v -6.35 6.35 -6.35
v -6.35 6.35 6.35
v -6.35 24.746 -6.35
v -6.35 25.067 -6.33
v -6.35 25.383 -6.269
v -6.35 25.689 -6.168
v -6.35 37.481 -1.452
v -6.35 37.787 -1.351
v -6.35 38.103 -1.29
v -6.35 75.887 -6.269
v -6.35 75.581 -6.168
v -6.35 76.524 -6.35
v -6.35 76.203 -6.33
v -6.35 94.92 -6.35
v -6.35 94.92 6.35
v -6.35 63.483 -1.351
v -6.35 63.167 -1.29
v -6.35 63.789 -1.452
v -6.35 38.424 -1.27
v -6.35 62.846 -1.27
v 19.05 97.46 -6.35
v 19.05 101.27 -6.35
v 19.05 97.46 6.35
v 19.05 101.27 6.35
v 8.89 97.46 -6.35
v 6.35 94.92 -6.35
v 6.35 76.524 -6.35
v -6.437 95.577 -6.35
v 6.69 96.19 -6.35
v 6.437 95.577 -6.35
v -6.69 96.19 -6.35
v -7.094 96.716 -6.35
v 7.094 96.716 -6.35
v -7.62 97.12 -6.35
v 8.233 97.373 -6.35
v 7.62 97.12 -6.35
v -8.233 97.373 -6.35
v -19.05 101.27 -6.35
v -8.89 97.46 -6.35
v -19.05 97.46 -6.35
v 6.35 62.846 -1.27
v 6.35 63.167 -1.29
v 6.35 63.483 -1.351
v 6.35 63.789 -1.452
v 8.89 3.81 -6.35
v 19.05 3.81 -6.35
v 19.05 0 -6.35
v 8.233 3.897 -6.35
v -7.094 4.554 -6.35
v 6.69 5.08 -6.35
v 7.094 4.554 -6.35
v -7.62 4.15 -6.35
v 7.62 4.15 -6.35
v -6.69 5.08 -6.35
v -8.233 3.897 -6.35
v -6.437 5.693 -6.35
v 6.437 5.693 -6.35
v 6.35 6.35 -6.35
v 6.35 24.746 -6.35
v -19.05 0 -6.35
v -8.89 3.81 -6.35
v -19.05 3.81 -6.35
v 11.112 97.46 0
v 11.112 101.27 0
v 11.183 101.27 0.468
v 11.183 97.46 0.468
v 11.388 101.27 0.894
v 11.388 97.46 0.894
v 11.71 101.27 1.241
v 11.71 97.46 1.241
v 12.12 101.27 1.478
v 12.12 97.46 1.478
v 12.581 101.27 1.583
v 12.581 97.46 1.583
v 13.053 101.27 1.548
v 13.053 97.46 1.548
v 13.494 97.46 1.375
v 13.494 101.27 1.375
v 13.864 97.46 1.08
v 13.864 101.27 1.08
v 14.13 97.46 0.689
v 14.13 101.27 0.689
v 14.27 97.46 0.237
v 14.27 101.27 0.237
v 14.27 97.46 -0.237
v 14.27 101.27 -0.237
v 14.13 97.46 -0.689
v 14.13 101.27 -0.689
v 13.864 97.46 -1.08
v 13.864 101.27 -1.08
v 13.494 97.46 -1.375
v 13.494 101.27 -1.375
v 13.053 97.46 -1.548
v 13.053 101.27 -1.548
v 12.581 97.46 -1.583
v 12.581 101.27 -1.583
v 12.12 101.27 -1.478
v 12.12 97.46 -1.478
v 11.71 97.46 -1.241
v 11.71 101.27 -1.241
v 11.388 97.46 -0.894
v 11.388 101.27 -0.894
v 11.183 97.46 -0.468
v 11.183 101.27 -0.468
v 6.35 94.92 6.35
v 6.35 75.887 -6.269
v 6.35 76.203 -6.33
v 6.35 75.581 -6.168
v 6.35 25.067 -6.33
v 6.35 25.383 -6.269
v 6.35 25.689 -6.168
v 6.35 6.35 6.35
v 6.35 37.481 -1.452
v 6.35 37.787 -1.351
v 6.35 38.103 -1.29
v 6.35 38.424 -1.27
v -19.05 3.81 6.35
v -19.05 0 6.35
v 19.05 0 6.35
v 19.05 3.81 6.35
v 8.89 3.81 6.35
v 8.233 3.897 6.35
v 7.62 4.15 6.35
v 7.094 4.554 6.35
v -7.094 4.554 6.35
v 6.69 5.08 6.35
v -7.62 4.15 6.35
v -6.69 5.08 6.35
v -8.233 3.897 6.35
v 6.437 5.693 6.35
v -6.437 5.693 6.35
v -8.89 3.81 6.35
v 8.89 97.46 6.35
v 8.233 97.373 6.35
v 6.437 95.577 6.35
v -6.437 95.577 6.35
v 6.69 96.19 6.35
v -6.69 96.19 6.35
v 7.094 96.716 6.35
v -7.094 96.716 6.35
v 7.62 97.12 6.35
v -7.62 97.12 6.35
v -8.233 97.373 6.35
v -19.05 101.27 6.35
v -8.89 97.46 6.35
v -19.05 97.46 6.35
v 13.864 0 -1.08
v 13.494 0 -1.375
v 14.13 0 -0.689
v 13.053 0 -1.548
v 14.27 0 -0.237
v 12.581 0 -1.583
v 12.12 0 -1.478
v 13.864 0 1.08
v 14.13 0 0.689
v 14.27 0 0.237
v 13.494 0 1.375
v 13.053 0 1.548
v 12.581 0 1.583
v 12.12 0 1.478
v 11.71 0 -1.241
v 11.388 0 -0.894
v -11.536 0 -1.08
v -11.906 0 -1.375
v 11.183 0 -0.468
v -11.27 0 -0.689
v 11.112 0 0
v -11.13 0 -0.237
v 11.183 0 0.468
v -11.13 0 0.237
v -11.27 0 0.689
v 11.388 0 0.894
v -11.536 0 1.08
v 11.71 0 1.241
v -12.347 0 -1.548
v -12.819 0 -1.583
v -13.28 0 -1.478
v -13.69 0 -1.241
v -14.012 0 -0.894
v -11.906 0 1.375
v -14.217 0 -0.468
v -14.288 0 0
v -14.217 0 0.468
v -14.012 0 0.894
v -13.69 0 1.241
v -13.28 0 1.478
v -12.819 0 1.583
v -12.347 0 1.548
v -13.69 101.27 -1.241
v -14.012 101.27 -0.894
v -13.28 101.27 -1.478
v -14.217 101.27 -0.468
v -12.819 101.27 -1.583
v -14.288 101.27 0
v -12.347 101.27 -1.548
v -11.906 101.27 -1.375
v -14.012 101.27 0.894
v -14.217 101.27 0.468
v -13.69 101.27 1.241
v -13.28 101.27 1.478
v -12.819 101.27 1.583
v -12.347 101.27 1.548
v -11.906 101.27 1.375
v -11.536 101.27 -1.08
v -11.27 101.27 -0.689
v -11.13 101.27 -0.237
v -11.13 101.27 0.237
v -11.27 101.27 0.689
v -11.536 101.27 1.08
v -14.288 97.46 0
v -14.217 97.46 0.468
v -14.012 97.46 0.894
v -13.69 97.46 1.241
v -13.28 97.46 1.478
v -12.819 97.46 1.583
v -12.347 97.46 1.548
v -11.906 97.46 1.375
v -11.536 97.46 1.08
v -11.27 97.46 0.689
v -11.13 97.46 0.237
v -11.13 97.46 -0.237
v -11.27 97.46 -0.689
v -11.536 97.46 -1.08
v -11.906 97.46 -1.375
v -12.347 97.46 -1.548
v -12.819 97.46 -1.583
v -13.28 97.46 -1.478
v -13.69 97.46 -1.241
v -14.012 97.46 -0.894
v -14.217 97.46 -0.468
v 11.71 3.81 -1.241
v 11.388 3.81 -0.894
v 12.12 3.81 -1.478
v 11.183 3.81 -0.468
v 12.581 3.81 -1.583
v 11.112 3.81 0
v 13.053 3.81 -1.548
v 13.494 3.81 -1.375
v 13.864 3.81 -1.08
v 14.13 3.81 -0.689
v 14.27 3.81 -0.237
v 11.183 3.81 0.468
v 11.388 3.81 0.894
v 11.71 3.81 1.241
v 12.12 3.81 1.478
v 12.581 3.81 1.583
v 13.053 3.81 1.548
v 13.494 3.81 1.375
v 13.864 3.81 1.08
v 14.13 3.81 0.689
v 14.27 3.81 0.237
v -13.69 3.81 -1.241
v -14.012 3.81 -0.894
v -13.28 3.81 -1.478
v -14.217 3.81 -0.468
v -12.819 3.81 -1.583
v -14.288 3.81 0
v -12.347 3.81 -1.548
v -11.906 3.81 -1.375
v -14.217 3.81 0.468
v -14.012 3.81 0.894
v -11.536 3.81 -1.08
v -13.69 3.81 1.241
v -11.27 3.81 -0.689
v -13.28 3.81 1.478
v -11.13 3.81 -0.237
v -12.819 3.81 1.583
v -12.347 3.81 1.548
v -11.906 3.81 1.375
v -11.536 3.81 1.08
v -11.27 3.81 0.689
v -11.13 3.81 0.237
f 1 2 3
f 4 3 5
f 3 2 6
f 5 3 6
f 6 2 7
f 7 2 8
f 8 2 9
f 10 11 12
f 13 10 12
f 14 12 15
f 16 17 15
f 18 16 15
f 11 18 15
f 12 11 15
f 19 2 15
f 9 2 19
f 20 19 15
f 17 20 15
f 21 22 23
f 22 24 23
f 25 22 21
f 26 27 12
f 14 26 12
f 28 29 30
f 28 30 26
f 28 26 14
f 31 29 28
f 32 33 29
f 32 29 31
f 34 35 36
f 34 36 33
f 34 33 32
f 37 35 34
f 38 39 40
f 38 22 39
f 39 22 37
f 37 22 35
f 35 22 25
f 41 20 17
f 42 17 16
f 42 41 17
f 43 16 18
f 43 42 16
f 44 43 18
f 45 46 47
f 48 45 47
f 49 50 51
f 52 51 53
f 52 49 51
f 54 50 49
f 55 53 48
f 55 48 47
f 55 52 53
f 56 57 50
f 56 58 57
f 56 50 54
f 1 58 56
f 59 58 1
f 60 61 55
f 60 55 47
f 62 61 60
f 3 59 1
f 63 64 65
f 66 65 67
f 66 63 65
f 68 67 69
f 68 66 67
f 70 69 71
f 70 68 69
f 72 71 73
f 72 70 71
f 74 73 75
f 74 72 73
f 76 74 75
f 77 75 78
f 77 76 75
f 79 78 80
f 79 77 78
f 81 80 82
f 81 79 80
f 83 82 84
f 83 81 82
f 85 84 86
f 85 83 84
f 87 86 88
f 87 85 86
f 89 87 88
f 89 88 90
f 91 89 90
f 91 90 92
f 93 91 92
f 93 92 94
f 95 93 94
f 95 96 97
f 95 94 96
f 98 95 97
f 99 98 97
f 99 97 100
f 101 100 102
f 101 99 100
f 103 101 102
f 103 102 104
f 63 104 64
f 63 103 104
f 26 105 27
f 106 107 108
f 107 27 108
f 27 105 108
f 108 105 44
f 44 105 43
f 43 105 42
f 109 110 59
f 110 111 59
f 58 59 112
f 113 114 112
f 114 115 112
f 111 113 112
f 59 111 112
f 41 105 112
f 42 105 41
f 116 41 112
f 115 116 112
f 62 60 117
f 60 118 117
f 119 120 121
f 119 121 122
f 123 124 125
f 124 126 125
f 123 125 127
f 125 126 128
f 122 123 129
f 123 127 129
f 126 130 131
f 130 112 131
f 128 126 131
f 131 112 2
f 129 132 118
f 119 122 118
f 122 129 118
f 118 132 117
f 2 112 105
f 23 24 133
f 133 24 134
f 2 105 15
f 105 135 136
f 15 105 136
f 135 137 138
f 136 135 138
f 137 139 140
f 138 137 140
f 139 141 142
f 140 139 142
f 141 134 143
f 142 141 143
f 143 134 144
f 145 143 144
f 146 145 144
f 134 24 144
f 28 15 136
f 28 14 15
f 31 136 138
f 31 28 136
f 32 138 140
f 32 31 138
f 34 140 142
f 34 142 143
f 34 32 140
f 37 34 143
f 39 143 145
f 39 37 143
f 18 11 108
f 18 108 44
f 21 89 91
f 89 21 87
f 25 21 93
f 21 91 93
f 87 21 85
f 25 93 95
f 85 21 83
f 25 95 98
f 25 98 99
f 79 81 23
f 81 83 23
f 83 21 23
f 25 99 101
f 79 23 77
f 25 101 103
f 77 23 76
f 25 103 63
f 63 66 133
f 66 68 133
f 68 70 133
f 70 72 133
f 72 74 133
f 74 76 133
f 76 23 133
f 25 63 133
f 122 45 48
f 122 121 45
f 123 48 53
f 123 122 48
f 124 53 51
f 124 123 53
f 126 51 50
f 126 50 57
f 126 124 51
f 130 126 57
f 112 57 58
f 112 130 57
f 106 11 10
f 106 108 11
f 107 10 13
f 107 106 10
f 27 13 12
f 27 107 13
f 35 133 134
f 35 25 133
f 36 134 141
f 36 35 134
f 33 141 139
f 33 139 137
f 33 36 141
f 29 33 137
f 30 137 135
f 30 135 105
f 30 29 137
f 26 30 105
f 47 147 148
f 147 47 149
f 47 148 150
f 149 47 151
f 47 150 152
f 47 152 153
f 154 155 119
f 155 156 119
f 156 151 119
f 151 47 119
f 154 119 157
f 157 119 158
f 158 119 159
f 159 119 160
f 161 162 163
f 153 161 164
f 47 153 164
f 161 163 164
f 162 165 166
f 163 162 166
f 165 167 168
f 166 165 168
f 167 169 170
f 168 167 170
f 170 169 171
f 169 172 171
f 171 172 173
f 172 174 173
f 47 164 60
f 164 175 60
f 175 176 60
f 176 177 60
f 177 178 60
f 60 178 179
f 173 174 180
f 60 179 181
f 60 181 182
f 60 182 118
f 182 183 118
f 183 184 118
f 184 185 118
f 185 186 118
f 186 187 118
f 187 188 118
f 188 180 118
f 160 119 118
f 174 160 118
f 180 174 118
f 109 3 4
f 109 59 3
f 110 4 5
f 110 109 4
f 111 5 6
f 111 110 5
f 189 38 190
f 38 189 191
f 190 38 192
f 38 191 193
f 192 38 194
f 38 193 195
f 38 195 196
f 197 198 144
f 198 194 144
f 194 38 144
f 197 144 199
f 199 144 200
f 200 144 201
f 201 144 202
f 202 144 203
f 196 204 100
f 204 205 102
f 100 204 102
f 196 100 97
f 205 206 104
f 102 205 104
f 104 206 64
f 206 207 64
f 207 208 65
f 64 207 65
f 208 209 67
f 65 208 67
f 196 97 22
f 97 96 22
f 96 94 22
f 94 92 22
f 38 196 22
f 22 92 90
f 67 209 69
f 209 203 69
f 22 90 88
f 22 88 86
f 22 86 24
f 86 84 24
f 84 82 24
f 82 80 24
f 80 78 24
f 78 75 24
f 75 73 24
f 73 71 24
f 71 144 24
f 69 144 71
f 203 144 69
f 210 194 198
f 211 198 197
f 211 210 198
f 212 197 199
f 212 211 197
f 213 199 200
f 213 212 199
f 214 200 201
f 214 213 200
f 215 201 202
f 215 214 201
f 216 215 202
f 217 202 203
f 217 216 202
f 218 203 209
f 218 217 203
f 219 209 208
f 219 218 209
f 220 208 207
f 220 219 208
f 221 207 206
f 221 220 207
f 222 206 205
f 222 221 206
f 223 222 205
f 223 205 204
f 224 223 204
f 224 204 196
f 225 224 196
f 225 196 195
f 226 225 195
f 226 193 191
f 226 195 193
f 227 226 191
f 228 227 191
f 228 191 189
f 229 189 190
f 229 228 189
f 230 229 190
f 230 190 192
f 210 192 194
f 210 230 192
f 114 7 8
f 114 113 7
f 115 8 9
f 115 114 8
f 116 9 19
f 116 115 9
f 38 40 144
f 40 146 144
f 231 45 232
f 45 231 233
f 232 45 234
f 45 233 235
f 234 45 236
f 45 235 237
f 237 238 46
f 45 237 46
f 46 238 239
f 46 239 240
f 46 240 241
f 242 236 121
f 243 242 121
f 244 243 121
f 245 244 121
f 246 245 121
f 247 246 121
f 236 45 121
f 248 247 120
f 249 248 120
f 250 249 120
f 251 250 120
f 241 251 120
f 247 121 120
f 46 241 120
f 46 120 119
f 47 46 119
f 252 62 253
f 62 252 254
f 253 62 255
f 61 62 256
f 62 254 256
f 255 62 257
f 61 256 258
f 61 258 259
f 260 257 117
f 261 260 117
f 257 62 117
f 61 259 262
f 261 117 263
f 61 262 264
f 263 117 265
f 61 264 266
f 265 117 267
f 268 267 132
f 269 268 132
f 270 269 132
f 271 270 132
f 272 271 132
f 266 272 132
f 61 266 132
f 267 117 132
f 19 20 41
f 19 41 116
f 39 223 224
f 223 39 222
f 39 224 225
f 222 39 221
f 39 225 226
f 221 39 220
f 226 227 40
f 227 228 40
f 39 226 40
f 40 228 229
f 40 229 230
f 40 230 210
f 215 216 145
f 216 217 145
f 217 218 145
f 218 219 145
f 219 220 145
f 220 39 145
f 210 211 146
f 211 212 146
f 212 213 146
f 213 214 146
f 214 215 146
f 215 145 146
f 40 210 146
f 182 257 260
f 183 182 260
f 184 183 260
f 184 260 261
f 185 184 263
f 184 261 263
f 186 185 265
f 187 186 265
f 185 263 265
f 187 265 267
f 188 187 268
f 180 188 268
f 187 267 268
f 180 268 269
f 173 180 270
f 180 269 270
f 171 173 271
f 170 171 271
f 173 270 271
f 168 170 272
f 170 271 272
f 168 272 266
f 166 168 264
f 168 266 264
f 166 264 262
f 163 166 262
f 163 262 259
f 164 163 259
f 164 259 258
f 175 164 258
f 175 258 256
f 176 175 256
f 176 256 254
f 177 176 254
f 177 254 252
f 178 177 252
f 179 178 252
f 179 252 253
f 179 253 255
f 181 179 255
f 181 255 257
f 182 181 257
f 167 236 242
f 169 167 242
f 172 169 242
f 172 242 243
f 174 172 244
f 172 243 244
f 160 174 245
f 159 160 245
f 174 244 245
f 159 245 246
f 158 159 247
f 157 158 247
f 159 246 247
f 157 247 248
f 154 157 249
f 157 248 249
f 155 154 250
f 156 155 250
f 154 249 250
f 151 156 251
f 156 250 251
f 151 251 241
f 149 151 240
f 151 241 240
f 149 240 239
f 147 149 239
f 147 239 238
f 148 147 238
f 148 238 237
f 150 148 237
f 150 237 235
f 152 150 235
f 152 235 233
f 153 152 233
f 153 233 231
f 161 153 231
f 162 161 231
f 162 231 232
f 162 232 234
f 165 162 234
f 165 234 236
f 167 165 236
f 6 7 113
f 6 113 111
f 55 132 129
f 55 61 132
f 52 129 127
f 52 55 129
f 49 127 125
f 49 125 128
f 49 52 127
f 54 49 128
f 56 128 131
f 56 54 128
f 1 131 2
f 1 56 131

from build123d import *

# Parameters (mm, degrees)
BOSS_EXTRUDE1_DEPTH = 6.35
SKETCH2_R           = 1.5875
MOUNT_HOLES_DEPTH   = 12.7
FILLET1_R           = 2.54
CUT_EXTRUDE1_DEPTH  = 105.599497571
FILLET2_R           = 2.54


with BuildPart() as part:
    # Sketch1 → Boss-Extrude1 (new, symmetric)
    with BuildSketch(Plane.XY):
        Polygon((19.05, 0), (-19.05, 0), (-19.05, 3.81), (-6.35, 3.81), (-6.35, 97.4598), (-19.05, 97.4598), (-19.05, 101.2698), (19.05, 101.2698), (19.05, 97.4598), (6.35, 97.4598), (6.35, 3.81), (19.05, 3.81), align=None)
    extrude(amount=BOSS_EXTRUDE1_DEPTH, both=True)

    # Sketch2 → Mount_Holes (cut)
    with BuildSketch(Plane(origin=(0, 3.81, 0), x_dir=(1, 0, 0), z_dir=(0, 1, 0))):
        with Locations(Location((12.7, 0, 0), (0, 0, 180))):
            Circle(SKETCH2_R)
        with Locations(Location((-12.7, 0, 0), (0, 0, 180))):
            Circle(SKETCH2_R)
    mount_holes = extrude(amount=-MOUNT_HOLES_DEPTH, mode=Mode.SUBTRACT)

    # Mirror1: Mount_Holes across plane
    add(mount_holes.mirror(Plane.ZX.offset(50.6349)), mode=Mode.SUBTRACT)

    # Fillet1
    fillet1_edges = [part.edges().sort_by_distance(p)[0] for p in [
        (-6.35, 3.81, 0),
        (-6.35, 97.4598, 0),
        (6.35, 97.4598, 0),
        (6.35, 3.81, 0),
    ]]
    fillet(fillet1_edges, radius=FILLET1_R)

    # Sketch3 → Cut-Extrude1 (cut, through all)
    with BuildSketch(Plane.ZY.offset(6.35)):
        Polygon((-6.35, 25.2349), (-6.35, 76.0349), (-1.27, 63.3349), (-1.27, 37.9349), align=None)
    extrude(amount=-CUT_EXTRUDE1_DEPTH, mode=Mode.SUBTRACT)

    # Fillet2
    fillet2_edges = [part.edges().sort_by_distance(p)[0] for p in [
        (0, 25.2349, -6.35),
        (0, 76.0349, -6.35),
        (0, 63.3349, -1.27),
        (0, 37.9349, -1.27),
    ]]
    fillet(fillet2_edges, radius=FILLET2_R)


solid = part.part
